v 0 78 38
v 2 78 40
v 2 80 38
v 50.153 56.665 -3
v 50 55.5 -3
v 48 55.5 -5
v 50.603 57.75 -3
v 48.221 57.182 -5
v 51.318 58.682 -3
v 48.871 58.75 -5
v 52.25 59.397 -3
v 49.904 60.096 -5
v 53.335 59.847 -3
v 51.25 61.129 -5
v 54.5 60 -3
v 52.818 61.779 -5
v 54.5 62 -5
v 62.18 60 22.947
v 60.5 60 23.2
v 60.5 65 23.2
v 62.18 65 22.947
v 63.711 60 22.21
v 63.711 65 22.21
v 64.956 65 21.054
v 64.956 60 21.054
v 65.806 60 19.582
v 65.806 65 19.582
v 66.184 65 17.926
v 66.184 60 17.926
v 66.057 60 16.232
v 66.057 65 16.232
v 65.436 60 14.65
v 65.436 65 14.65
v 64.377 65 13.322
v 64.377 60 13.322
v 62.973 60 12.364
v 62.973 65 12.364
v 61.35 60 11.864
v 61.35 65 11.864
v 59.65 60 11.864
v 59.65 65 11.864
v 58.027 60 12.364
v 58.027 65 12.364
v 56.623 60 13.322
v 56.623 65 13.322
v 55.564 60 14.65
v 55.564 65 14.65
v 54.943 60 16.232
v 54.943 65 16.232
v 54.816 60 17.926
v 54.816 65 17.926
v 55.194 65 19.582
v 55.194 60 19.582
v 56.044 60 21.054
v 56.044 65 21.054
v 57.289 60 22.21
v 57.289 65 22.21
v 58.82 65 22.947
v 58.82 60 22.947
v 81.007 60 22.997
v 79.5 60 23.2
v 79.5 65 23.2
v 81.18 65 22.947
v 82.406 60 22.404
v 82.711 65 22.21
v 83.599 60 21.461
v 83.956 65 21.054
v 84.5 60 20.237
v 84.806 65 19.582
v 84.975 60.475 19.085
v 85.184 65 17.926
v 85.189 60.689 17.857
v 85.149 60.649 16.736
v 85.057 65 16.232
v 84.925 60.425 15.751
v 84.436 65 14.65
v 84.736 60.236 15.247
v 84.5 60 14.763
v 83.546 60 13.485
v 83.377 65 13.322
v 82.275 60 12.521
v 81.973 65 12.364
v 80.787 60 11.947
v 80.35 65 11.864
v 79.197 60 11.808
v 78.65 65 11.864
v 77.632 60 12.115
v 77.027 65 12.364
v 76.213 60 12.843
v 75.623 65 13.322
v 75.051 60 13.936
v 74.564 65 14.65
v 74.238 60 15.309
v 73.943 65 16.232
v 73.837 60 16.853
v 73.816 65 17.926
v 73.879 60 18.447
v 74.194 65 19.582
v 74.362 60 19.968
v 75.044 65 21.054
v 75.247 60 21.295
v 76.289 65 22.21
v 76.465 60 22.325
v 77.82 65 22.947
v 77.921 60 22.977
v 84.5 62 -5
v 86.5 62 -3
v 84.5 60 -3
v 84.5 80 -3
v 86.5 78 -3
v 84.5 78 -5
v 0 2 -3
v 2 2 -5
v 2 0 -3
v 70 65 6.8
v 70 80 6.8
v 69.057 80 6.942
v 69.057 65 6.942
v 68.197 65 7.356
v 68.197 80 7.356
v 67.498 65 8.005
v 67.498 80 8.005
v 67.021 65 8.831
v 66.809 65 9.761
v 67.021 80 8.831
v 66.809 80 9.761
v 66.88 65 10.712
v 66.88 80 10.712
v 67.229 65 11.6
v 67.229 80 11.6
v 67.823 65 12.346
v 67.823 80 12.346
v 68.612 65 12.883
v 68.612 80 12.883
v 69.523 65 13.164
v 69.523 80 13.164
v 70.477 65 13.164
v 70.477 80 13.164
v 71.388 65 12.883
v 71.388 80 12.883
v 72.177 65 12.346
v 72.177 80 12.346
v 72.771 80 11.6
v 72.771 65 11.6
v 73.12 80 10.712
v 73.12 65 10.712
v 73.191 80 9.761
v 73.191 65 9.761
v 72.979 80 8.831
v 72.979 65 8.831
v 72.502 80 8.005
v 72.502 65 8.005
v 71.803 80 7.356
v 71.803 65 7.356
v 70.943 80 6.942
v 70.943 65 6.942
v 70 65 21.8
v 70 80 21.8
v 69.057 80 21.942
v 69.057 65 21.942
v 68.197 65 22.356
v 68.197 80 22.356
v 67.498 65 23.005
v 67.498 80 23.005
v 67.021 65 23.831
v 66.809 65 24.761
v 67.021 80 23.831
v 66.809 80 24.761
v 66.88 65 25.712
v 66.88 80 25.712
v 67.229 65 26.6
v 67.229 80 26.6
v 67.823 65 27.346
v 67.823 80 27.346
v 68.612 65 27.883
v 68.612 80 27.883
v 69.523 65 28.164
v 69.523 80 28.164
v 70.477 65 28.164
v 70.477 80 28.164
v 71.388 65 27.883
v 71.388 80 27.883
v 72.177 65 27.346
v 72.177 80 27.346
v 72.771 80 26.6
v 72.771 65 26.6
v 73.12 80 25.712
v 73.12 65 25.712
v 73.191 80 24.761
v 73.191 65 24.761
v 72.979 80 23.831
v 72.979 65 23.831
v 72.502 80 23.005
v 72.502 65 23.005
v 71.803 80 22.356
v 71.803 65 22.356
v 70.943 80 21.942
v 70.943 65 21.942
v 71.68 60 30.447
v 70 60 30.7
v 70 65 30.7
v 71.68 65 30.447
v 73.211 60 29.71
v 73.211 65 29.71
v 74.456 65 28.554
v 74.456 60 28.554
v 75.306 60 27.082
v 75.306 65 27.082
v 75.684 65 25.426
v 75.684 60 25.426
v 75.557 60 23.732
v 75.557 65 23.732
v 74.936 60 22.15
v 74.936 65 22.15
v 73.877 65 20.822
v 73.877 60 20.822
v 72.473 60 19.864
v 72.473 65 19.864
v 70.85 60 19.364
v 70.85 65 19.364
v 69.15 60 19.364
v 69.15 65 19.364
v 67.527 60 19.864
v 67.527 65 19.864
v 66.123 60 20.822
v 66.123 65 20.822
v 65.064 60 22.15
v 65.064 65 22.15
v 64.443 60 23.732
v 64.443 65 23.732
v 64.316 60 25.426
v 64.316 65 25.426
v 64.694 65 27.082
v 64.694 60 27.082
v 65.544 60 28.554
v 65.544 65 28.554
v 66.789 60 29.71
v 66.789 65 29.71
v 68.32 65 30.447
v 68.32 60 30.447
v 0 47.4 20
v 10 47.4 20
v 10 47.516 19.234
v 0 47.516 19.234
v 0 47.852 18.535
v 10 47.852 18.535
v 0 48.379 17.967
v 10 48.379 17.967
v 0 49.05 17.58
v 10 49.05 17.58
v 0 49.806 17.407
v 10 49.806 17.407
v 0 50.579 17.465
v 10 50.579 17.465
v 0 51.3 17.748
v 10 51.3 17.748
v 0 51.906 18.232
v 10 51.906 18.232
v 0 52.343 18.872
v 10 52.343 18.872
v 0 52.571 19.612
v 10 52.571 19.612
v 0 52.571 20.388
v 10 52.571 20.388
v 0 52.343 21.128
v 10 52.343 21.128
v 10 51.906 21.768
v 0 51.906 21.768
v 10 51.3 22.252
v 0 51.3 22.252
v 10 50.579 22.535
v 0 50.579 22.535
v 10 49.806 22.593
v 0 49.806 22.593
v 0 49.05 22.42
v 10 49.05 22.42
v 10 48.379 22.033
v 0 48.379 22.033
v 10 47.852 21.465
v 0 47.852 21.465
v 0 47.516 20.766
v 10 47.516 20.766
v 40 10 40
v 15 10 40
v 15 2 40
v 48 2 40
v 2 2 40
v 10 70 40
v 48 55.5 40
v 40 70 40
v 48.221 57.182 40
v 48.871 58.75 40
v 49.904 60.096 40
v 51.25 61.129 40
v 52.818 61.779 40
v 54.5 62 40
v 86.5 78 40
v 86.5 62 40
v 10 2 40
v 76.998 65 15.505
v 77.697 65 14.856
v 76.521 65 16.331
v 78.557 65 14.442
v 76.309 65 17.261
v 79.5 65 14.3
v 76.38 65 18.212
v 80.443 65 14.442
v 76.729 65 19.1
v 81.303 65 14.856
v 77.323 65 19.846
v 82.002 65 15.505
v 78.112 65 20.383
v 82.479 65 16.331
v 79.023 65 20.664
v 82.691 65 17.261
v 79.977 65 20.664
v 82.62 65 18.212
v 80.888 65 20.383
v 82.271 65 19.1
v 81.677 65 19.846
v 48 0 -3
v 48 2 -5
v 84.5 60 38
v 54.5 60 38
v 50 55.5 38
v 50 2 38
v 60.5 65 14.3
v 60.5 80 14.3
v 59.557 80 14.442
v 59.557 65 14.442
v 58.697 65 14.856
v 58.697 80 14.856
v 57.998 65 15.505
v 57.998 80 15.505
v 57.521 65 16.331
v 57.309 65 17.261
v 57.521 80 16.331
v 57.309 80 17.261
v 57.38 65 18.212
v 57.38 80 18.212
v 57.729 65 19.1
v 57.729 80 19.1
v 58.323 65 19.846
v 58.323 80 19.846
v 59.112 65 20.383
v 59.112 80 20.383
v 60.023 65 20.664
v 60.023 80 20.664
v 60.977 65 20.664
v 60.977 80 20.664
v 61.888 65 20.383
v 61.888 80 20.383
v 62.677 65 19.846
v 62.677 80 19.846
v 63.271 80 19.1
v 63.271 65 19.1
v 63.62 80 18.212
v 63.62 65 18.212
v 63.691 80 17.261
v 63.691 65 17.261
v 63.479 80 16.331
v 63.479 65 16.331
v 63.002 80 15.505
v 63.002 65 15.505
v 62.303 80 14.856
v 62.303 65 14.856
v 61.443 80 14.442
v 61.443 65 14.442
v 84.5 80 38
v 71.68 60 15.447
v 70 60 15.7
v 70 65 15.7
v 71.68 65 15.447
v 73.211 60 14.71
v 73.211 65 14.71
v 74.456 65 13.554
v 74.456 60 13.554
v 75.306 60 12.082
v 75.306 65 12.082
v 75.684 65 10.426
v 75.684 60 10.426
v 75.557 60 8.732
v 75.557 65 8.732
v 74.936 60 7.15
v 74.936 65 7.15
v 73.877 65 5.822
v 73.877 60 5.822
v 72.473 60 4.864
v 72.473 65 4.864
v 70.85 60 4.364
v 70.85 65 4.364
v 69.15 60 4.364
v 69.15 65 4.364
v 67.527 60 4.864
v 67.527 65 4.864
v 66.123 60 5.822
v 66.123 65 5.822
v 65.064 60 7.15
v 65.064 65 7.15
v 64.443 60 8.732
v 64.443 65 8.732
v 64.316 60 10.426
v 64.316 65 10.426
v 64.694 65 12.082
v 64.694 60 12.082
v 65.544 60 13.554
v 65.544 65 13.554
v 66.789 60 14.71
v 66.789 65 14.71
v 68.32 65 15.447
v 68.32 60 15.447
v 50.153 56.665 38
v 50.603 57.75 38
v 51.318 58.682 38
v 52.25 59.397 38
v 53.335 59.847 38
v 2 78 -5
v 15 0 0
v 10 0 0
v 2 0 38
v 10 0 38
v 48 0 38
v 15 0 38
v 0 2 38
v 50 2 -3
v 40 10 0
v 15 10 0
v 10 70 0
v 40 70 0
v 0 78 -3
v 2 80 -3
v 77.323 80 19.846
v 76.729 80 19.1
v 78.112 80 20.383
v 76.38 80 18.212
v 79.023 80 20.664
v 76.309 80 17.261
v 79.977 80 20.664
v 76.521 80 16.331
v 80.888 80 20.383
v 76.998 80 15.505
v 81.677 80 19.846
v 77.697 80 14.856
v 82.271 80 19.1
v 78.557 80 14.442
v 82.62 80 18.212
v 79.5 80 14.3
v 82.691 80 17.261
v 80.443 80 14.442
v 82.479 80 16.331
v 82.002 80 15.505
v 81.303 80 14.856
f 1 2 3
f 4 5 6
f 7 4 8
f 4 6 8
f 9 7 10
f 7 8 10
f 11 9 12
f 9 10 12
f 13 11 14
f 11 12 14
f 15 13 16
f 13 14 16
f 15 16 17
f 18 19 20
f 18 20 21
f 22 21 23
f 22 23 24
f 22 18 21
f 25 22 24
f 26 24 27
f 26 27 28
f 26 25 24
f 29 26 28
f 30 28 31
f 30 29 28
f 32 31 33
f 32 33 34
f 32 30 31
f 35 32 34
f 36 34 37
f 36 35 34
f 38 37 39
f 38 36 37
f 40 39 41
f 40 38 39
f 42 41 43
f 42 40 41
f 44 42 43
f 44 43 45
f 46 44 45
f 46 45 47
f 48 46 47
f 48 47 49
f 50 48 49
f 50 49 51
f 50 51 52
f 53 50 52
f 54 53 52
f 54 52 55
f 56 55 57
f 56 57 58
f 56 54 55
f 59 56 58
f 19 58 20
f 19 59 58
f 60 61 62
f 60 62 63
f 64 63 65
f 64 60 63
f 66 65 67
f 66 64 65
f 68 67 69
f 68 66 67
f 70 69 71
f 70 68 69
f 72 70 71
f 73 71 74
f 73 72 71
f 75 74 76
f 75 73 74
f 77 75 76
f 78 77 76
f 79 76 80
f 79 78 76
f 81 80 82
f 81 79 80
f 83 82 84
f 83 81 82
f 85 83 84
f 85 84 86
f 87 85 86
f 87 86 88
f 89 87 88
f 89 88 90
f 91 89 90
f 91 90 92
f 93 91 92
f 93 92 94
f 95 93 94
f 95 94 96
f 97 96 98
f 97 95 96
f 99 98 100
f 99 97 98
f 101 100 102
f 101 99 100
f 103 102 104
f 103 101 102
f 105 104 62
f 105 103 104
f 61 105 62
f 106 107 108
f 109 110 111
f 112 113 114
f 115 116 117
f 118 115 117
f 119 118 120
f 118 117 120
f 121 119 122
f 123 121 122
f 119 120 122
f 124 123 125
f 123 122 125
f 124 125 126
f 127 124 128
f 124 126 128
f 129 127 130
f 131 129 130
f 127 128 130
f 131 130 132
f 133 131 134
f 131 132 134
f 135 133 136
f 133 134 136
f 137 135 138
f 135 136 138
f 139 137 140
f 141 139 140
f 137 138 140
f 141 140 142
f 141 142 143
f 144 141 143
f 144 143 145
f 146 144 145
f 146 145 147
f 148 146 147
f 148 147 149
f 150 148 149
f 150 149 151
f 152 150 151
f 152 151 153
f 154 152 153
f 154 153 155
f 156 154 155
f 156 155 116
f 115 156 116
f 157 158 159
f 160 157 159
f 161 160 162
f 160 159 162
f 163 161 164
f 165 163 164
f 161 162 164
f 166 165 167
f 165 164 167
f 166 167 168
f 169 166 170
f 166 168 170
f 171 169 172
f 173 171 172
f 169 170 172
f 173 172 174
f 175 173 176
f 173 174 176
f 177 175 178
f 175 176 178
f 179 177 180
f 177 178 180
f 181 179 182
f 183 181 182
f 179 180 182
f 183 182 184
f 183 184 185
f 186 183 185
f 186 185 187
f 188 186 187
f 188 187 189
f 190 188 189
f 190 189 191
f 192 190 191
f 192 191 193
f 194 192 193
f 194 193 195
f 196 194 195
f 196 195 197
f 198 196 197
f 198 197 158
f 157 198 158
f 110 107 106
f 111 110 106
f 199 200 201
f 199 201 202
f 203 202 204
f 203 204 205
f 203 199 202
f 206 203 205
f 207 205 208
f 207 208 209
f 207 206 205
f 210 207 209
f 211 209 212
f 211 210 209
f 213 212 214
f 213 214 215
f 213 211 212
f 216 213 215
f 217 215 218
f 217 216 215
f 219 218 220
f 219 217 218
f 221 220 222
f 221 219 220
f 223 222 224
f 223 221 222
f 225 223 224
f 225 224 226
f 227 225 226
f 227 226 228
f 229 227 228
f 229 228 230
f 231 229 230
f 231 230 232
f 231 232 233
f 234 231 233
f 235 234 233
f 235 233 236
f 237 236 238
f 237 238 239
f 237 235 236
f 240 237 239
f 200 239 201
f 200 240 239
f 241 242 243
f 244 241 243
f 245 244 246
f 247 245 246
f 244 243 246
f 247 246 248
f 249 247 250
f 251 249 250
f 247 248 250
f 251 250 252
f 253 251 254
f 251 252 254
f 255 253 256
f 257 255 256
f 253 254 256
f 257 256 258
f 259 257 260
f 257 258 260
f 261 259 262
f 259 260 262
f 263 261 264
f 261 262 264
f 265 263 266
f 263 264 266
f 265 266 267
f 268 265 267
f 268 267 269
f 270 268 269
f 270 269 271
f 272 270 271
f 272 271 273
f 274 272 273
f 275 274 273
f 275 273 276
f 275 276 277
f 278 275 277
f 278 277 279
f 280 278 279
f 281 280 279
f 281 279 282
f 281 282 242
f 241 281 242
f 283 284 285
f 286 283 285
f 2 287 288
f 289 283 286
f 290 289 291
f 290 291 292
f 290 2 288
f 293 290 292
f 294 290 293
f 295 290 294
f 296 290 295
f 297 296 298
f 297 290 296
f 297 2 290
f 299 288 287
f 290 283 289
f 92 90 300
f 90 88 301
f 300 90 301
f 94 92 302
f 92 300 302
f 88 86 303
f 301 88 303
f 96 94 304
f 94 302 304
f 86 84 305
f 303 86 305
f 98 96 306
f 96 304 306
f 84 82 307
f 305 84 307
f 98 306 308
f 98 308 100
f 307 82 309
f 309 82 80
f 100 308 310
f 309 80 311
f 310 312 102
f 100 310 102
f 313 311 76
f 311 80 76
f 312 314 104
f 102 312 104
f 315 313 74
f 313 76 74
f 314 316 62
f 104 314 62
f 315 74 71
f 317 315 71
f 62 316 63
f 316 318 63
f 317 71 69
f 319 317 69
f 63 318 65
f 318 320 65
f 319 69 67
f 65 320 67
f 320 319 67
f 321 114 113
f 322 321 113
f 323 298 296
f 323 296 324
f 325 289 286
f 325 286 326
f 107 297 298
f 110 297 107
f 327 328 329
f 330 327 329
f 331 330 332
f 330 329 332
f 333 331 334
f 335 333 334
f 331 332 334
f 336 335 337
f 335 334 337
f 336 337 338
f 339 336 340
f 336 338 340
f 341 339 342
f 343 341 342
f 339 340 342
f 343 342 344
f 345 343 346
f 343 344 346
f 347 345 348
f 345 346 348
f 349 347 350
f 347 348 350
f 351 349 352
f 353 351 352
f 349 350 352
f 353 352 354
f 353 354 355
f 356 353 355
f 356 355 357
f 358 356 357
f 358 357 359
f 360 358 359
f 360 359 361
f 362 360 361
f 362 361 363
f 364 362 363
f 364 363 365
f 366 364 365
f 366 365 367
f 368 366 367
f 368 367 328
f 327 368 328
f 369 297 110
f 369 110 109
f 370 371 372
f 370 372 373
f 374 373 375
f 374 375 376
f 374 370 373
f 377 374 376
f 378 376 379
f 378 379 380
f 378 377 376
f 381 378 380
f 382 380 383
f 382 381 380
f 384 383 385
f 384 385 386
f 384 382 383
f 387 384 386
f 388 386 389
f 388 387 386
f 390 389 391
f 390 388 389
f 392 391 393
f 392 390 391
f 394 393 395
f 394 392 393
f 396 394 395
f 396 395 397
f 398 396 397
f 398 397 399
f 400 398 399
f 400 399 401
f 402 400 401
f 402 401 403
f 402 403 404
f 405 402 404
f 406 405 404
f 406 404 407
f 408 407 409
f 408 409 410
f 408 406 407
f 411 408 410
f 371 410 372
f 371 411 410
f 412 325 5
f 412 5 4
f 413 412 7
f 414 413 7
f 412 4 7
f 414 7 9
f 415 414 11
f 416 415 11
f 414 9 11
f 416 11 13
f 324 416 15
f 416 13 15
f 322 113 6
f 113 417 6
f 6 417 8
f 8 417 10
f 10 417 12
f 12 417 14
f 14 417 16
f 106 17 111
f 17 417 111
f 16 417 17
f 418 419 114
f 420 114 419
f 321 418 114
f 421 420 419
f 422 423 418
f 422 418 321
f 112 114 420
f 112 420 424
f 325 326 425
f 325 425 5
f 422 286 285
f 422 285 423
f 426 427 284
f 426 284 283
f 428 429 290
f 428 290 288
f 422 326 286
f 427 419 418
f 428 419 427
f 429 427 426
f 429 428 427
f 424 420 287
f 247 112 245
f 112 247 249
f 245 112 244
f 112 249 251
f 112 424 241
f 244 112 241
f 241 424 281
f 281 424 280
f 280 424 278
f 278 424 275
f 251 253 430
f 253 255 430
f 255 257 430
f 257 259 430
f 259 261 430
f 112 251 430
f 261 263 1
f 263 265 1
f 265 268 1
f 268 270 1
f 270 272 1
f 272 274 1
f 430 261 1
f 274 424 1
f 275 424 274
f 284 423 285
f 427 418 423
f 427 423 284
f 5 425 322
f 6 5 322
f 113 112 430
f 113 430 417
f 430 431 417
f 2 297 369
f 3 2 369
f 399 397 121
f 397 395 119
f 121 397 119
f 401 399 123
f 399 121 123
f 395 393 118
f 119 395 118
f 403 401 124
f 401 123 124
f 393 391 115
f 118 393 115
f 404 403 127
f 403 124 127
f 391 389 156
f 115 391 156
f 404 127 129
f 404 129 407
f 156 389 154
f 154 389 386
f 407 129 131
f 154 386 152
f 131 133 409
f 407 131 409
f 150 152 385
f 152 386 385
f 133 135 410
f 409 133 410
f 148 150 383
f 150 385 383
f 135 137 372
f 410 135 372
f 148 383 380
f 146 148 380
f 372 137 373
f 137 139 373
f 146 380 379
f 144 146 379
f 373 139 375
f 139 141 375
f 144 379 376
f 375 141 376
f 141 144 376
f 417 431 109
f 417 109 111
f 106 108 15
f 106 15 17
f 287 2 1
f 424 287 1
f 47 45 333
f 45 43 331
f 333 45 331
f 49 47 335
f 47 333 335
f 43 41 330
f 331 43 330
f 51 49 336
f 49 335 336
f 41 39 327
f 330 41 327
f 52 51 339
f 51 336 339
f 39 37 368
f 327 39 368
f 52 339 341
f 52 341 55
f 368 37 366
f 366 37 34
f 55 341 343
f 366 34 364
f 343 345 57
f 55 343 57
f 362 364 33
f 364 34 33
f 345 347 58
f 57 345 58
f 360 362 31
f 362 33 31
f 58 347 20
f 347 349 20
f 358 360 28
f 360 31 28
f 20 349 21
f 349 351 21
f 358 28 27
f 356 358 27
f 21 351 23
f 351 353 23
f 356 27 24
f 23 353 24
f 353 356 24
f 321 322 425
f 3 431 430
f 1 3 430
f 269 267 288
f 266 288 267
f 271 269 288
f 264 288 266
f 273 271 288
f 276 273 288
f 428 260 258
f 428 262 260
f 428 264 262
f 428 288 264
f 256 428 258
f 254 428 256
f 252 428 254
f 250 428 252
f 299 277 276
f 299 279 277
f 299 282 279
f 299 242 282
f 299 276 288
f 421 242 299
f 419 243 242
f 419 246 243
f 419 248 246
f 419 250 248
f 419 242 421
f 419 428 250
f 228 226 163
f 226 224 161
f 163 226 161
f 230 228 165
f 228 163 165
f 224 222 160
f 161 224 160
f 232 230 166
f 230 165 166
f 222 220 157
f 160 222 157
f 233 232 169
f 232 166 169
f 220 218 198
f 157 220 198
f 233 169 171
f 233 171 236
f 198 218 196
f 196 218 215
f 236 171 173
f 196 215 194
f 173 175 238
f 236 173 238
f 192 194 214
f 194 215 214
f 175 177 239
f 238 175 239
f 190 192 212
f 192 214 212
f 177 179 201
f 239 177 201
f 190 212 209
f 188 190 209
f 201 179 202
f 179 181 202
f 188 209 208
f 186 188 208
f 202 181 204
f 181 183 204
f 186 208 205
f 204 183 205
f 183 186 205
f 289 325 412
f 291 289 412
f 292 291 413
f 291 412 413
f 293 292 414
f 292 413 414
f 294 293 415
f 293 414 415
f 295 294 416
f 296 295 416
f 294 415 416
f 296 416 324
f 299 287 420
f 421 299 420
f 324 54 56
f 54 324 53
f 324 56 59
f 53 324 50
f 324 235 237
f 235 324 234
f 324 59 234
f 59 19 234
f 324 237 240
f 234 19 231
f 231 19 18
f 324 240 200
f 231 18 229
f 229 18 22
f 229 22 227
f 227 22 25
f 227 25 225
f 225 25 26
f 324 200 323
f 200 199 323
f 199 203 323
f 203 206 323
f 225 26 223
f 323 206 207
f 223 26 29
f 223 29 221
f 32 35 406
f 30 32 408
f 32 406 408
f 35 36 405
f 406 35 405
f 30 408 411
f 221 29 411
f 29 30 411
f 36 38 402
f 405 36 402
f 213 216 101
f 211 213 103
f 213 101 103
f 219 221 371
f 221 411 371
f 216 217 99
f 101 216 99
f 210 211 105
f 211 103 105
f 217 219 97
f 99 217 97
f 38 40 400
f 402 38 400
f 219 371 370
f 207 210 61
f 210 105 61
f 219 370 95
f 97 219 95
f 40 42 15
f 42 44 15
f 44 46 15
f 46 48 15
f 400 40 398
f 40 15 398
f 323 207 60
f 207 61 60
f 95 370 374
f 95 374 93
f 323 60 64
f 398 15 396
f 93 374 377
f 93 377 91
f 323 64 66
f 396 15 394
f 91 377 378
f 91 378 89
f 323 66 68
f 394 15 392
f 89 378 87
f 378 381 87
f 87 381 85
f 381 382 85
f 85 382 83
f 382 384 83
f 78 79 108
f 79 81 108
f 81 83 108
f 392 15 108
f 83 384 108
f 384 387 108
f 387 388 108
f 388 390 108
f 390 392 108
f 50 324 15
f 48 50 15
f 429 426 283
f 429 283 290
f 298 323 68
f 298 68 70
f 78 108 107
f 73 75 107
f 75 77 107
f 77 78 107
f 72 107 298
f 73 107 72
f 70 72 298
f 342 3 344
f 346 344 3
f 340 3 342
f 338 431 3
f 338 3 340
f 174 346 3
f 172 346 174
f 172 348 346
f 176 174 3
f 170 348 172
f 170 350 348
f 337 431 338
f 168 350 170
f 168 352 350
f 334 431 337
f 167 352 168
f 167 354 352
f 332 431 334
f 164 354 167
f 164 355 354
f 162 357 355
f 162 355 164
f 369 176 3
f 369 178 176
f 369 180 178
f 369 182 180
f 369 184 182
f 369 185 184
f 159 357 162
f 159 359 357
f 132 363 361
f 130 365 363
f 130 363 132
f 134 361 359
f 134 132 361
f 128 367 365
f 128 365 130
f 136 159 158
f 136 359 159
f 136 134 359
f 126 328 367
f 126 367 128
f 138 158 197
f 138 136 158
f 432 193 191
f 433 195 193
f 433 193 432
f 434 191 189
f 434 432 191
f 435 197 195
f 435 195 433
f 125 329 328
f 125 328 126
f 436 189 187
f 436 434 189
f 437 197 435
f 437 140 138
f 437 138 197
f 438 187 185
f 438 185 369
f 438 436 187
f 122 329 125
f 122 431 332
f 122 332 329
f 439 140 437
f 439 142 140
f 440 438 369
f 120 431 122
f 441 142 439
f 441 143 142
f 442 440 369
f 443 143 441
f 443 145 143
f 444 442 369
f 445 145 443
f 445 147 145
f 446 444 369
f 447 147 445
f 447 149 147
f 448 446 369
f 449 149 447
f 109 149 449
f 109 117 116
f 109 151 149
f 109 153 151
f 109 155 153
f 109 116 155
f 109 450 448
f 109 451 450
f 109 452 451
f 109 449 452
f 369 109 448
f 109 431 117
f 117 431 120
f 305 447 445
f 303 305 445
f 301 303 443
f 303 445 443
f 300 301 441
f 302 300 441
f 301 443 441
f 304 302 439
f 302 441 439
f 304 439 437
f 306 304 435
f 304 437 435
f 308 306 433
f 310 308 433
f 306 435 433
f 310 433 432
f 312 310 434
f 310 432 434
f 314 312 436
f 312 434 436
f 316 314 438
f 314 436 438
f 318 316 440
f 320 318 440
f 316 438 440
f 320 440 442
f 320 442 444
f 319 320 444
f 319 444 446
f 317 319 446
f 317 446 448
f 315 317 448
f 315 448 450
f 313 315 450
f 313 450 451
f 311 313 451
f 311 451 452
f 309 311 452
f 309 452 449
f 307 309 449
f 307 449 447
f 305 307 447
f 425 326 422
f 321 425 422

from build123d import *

# Parameters (mm, degrees)
BOSS_EXTRUDE1_DEPTH = 40
CUT_EXTRUDE1_START  = 10
SKETCH2_R           = 2.6
CUT_EXTRUDE1_DEPTH  = 113.46950766
SKETCH9_W           = 50
SKETCH9_H           = 80
BOSS_EXTRUDE2_DEPTH = 5
BOSS_EXTRUDE4_START = 80
SKETCH11_W          = 36.5
SKETCH11_H          = 45
SKETCH11_R          = 3.2
BOSS_EXTRUDE4_DEPTH = 20
CUT_EXTRUDE11_START = 60
SKETCH12_R          = 5.7
CUT_EXTRUDE11_DEPTH = 5
FILLET1_R           = 4.5


with BuildPart() as part:
    # Sketch1 → Boss-Extrude1 (new body)
    with BuildSketch(Plane.XY):
        Polygon((10, 0), (0, 0), (0, 80), (50, 80), (50, 0), (15, 0), (15, 10), (40, 10), (40, 70), (10, 70), align=None)
    extrude(amount=BOSS_EXTRUDE1_DEPTH)

    # Sketch2 → Cut-Extrude1 (cut, through all)
    with BuildSketch(Plane(origin=(0, 0, 0), x_dir=(0, 0, -1), z_dir=(1, 0, 0)).offset(CUT_EXTRUDE1_START)):
        with Locations(Location((-20, 50, 0), (0, 0, 270))):
            Circle(SKETCH2_R)
    extrude(amount=-CUT_EXTRUDE1_DEPTH, mode=Mode.SUBTRACT)

    # Sketch9 → Boss-Extrude2 (add)
    with BuildSketch(Plane.XY):
        with Locations((25, 40)):
            Rectangle(SKETCH9_W, SKETCH9_H)
    extrude(amount=-BOSS_EXTRUDE2_DEPTH)

    # Sketch11 → Boss-Extrude4 (add)
    with BuildSketch(Plane(origin=(0, 0, 0), x_dir=(1, 0, 0), z_dir=(0, 1, 0)).offset(BOSS_EXTRUDE4_START)):
        with Locations((68.25, -17.5)):
            Rectangle(SKETCH11_W, SKETCH11_H)
        with Locations(Location((60.5, -17.5, 0), (0, 0, 90))):
            Circle(SKETCH11_R, mode=Mode.SUBTRACT)
        with Locations(Location((70, -10, 0), (0, 0, 90))):
            Circle(SKETCH11_R, mode=Mode.SUBTRACT)
        with Locations(Location((79.5, -17.5, 0), (0, 0, 90))):
            Circle(SKETCH11_R, mode=Mode.SUBTRACT)
        with Locations(Location((70, -25, 0), (0, 0, 90))):
            Circle(SKETCH11_R, mode=Mode.SUBTRACT)
    extrude(amount=-BOSS_EXTRUDE4_DEPTH)

    # Sketch12 → Cut-Extrude11 (cut)
    with BuildSketch(Plane(origin=(0, 0, 0), x_dir=(1, 0, 0), z_dir=(0, 1, 0)).offset(CUT_EXTRUDE11_START)):
        with Locations(Location((70, -10, 0), (0, 0, 270))):
            Circle(SKETCH12_R)
        with Locations(Location((79.5, -17.5, 0), (0, 0, 270))):
            Circle(SKETCH12_R)
        with Locations(Location((70, -25, 0), (0, 0, 270))):
            Circle(SKETCH12_R)
        with Locations(Location((60.5, -17.5, 0), (0, 0, 270))):
            Circle(SKETCH12_R)
    extrude(amount=CUT_EXTRUDE11_DEPTH, mode=Mode.SUBTRACT)

    # Fillet1
    fillet1_edges = [part.edges().sort_by_distance(p)[0] for p in [
        (50, 60, 17.5),
    ]]
    fillet(fillet1_edges, radius=FILLET1_R)

    # Chamfer1
    # the kernel refuses this chamfer: 2 mm, written as the material it takes off along each edge
    with BuildSketch(Plane(origin=(1.333333333, 1.333333333, 38.666666667), x_dir=(0, -0.7071067811865475, -0.7071067811865475), z_dir=(-0.5773502691896347, -0.5773502691896213, 0.5773502691896212)), Plane(origin=(1.333333333, 78.666666667, -3.666666667), x_dir=(0, 0.7071067811865475, 0.7071067811865475), z_dir=(-0.5773502691896258, 0.5773502691896258, -0.5773502691896258)), Plane(origin=(48.666666667, 1.333333333, -3.666666667), x_dir=(-0.7071067811865475, 0, -0.7071067811865475), z_dir=(0.5773502691897349, -0.5773502691894069, -0.5773502691897356)), Plane(origin=(48.666666667, 1.333333333, 38.666666667), x_dir=(0.7071067811865464, 0, -0.7071067811865488), z_dir=(0.5773502691897359, -0.5773502691894074, 0.577350269189734)), Plane(origin=(85.166666667, 78.666666667, -3.666666667), x_dir=(0.7071067811865477, 0, 0.7071067811865474), z_dir=(0.5773502691896257, 0.5773502691896257, -0.577350269189626)), Plane(origin=(85.166666667, 61.333333333, -3.666666667), x_dir=(0.7071067811865475, 0.7071067811865475, 0), z_dir=(0.5773502691896256, -0.5773502691896257, -0.5773502691896258))) as chamfer1_piece_1:
        Polygon((-1.414213562, 0.816496581), (1.414213562, 0.816496581), (0, -1.632993162), align=None)
    extrude(amount=2.540341184, mode=Mode.SUBTRACT)
    with BuildSketch(Plane(origin=(1.333333333, 1.333333333, -3.666666667), x_dir=(0, -0.7071067811865558, 0.7071067811865391), z_dir=(-0.5773502691896303, -0.5773502691896167, -0.5773502691896303)), Plane(origin=(1.333333333, 78.666666667, 38.666666667), x_dir=(0, 0.7071067811865475, -0.7071067811865475), z_dir=(-0.5773502691896258, 0.5773502691896258, 0.5773502691896258))) as chamfer1_piece_2:
        Polygon((-1.414213562, -0.816496581), (1.414213562, -0.816496581), (0, 1.632993162), align=None)
    extrude(amount=2.540341184, mode=Mode.SUBTRACT)
    with BuildSketch(Plane(origin=(0, 0, 45.143365976), x_dir=(0.9996219169112961, -0.027495876610609604, 0), z_dir=(0, 0, -1)), Plane(origin=(86.5, 80, -10.143365976), x_dir=(0.027495876610589005, -0.9996219169112968, 0), z_dir=(0, 0, 1)), Plane(origin=(86.5, 60, -10.143365976), x_dir=(-0.9996219169112968, -0.02749587661058555, 0), z_dir=(0, 0, 1))) as chamfer1_piece_3:
        with BuildLine():
            Line((2.05734639, 0), (-0.11309431, -2.054235587))
            Line((-0.11309431, -2.054235587), (-0.153079186, -2.053135752))
            ThreePointArc((-0.153079186, -2.053135752), (-0.068258454, -1.026795659), (-0.039984877, 0.001099835))
            Line((-0.039984877, 0.001099835), (0.001099835, 0.039984877))
            ThreePointArc((0.001099835, 0.039984877), (1.028995329, 0.011711299), (2.058446225, 0.039984877))
            Line((2.058446225, 0.039984877), (2.05734639, 0))
        make_face()
    extrude(amount=55.286731952, mode=Mode.SUBTRACT)
    with BuildSketch(Plane(origin=(0, 80, 45.143365976), x_dir=(0.9996219169112968, 0.02749587661058908, 0), z_dir=(0, 0, -1)), Plane(origin=(50, 0, -10.143365976), x_dir=(0.027495876610585633, 0.9996219169112968, 0), z_dir=(0, 0, 1))) as chamfer1_piece_4:
        with BuildLine():
            Line((2.05734639, 0), (-0.11309431, 2.054235587))
            Line((-0.11309431, 2.054235587), (-0.153079186, 2.053135752))
            ThreePointArc((-0.153079186, 2.053135752), (-0.068258454, 1.026795659), (-0.039984877, -0.001099835))
            Line((-0.039984877, -0.001099835), (0.001099835, -0.039984877))
            ThreePointArc((0.001099835, -0.039984877), (1.028995329, -0.011711299), (2.058446225, -0.039984877))
            Line((2.058446225, -0.039984877), (2.05734639, 0))
        make_face()
    extrude(amount=55.286731952, mode=Mode.SUBTRACT)
    with BuildSketch(Plane(origin=(55.143365976, 0, 40), x_dir=(0, 0.9996219169112968, 0.02749587661058563), z_dir=(-1, 0, 0))) as chamfer1_piece_5:
        with BuildLine():
            Line((2.05734639, 0), (-0.11309431, 2.054235587))
            Line((-0.11309431, 2.054235587), (-0.153079186, 2.053135752))
            ThreePointArc((-0.153079186, 2.053135752), (-0.068258454, 1.026795659), (-0.039984877, -0.001099835))
            Line((-0.039984877, -0.001099835), (0.001099835, -0.039984877))
            ThreePointArc((0.001099835, -0.039984877), (1.028995329, -0.011711299), (2.058446225, -0.039984877))
            Line((2.058446225, -0.039984877), (2.05734639, 0))
        make_face()
    extrude(amount=45.286731952, mode=Mode.SUBTRACT)
    with BuildSketch(Plane(origin=(50, 55.5, 40), x_dir=(-0.9996219169112968, 0, 0.027495876610585647), z_dir=(0, -1, 0))) as chamfer1_piece_6:
        with BuildLine():
            Line((2.05734639, 0), (-0.11309431, 2.054235587))
            Line((-0.11309431, 2.054235587), (-0.153079186, 2.053135752))
            ThreePointArc((-0.153079186, 2.053135752), (-0.068258454, 1.026795659), (-0.039984877, -0.001099835))
            Line((-0.039984877, -0.001099835), (0.001099835, -0.039984877))
            ThreePointArc((0.001099835, -0.039984877), (1.028995329, -0.011711299), (2.058446225, -0.039984877))
            Line((2.058446225, -0.039984877), (2.05734639, 0))
        make_face()
    extrude(amount=60.643365976, mode=Mode.SUBTRACT)
    with BuildSketch(Plane(origin=(91.643365976, 80, 40), x_dir=(0, -0.9996219169112968, 0.02749587661058555), z_dir=(-1, 0, 0))) as chamfer1_piece_7:
        with BuildLine():
            Line((2.05734639, 0), (-0.11309431, -2.054235587))
            Line((-0.11309431, -2.054235587), (-0.153079186, -2.053135752))
            ThreePointArc((-0.153079186, -2.053135752), (-0.068258454, -1.026795659), (-0.039984877, 0.001099835))
            Line((-0.039984877, 0.001099835), (0.001099835, 0.039984877))
            ThreePointArc((0.001099835, 0.039984877), (1.028995329, 0.011711299), (2.058446225, 0.039984877))
            Line((2.058446225, 0.039984877), (2.05734639, 0))
        make_face()
    extrude(amount=96.786731952, mode=Mode.SUBTRACT)
    with BuildSketch(Plane(origin=(50, -5.143365976, -5), x_dir=(0.02749587661058563, 0, 0.9996219169112968), z_dir=(0, 1, 0))) as chamfer1_piece_8:
        with BuildLine():
            Line((2.05734639, 0), (-0.11309431, -2.054235587))
            Line((-0.11309431, -2.054235587), (-0.153079186, -2.053135752))
            ThreePointArc((-0.153079186, -2.053135752), (-0.068258454, -1.026795659), (-0.039984877, 0.001099835))
            Line((-0.039984877, 0.001099835), (0.001099835, 0.039984877))
            ThreePointArc((0.001099835, 0.039984877), (1.028995329, 0.011711299), (2.058446225, 0.039984877))
            Line((2.058446225, 0.039984877), (2.05734639, 0))
        make_face()
    extrude(amount=60.643365976, mode=Mode.SUBTRACT)
    with BuildSketch(Plane(origin=(-5.143365976, 0, -5), x_dir=(0, -0.027495876610586372, 0.9996219169112968), z_dir=(1, 0, 0))) as chamfer1_piece_9:
        with BuildLine():
            Line((2.05734639, 0), (-0.11309431, -2.054235587))
            Line((-0.11309431, -2.054235587), (-0.153079186, -2.053135752))
            ThreePointArc((-0.153079186, -2.053135752), (-0.068258454, -1.026795659), (-0.039984877, 0.001099835))
            Line((-0.039984877, 0.001099835), (0.001099835, 0.039984877))
            ThreePointArc((0.001099835, 0.039984877), (1.028995329, 0.011711299), (2.058446225, 0.039984877))
            Line((2.058446225, 0.039984877), (2.05734639, 0))
        make_face()
    extrude(amount=60.286731952, mode=Mode.SUBTRACT)
    with BuildSketch(Plane(origin=(0, 85.143365976, -5), x_dir=(-0.027495876610586372, 0, 0.9996219169112968), z_dir=(0, -1, 0))) as chamfer1_piece_10:
        with BuildLine():
            Line((2.05734639, 0), (-0.11309431, -2.054235587))
            Line((-0.11309431, -2.054235587), (-0.153079186, -2.053135752))
            ThreePointArc((-0.153079186, -2.053135752), (-0.068258454, -1.026795659), (-0.039984877, 0.001099835))
            Line((-0.039984877, 0.001099835), (0.001099835, 0.039984877))
            ThreePointArc((0.001099835, 0.039984877), (1.028995329, 0.011711299), (2.058446225, 0.039984877))
            Line((2.058446225, 0.039984877), (2.05734639, 0))
        make_face()
    extrude(amount=90.286731952, mode=Mode.SUBTRACT)
    with BuildSketch(Plane(origin=(0, -5.143365976, 40), x_dir=(0.9996219169112968, 0, 0.02749587661058563), z_dir=(0, 1, 0))) as chamfer1_piece_11:
        with BuildLine():
            Line((2.05734639, 0), (-0.11309431, 2.054235587))
            Line((-0.11309431, 2.054235587), (-0.153079186, 2.053135752))
            ThreePointArc((-0.153079186, 2.053135752), (-0.068258454, 1.026795659), (-0.039984877, -0.001099835))
            Line((-0.039984877, -0.001099835), (0.001099835, -0.039984877))
            ThreePointArc((0.001099835, -0.039984877), (1.028995329, -0.011711299), (2.058446225, -0.039984877))
            Line((2.058446225, -0.039984877), (2.05734639, 0))
        make_face()
    extrude(amount=90.286731952, mode=Mode.SUBTRACT)
    with BuildSketch(Plane(origin=(-5.143365976, 80, -5), x_dir=(0, 0.02749587661058908, 0.9996219169112968), z_dir=(1, 0, 0))) as chamfer1_piece_12:
        with BuildLine():
            Line((2.05734639, 0), (-0.11309431, 2.054235587))
            Line((-0.11309431, 2.054235587), (-0.153079186, 2.053135752))
            ThreePointArc((-0.153079186, 2.053135752), (-0.068258454, 1.026795659), (-0.039984877, -0.001099835))
            Line((-0.039984877, -0.001099835), (0.001099835, -0.039984877))
            ThreePointArc((0.001099835, -0.039984877), (1.028995329, -0.011711299), (2.058446225, -0.039984877))
            Line((2.058446225, -0.039984877), (2.05734639, 0))
        make_face()
    extrude(amount=96.786731952, mode=Mode.SUBTRACT)
    with BuildSketch(Plane(origin=(15.143365976, 0, 40), x_dir=(2.3568108242796768e-14, 0.9996219169112968, 0.027495876610585623), z_dir=(-1, 0, 0))) as chamfer1_piece_13:
        with BuildLine():
            Line((2.05734639, 0), (-0.11309431, 2.054235587))
            Line((-0.11309431, 2.054235587), (-0.153079186, 2.053135752))
            ThreePointArc((-0.153079186, 2.053135752), (-0.068258454, 1.026795659), (-0.039984877, -0.001099835))
            Line((-0.039984877, -0.001099835), (0.001099835, -0.039984877))
            ThreePointArc((0.001099835, -0.039984877), (1.028995329, -0.011711299), (2.058446225, -0.039984877))
            Line((2.058446225, -0.039984877), (2.05734639, 0))
        make_face()
    extrude(amount=20.286731952, mode=Mode.SUBTRACT)
    with BuildSketch(Plane(origin=(54.5, 60, -5), x_dir=(0, -0.027495876610585616, 0.9996219169112968), z_dir=(1, 0, 0))) as chamfer1_piece_14:
        with BuildLine():
            Line((2.05734639, 0), (-0.11309431, -2.054235587))
            Line((-0.11309431, -2.054235587), (-0.153079186, -2.053135752))
            ThreePointArc((-0.153079186, -2.053135752), (-0.068258454, -1.026795659), (-0.039984877, 0.001099835))
            Line((-0.039984877, 0.001099835), (0.001099835, 0.039984877))
            ThreePointArc((0.001099835, 0.039984877), (1.028995329, 0.011711299), (2.058446225, 0.039984877))
            Line((2.058446225, 0.039984877), (2.05734639, 0))
        make_face()
    extrude(amount=37.143365976, mode=Mode.SUBTRACT)
    with BuildSketch(Plane(origin=(86.5, 85.143365976, -5), x_dir=(0.02749587661058908, 0, 0.9996219169112968), z_dir=(0, -1, 0))) as chamfer1_piece_15:
        with BuildLine():
            Line((2.05734639, 0), (-0.11309431, 2.054235587))
            Line((-0.11309431, 2.054235587), (-0.153079186, 2.053135752))
            ThreePointArc((-0.153079186, 2.053135752), (-0.068258454, 1.026795659), (-0.039984877, -0.001099835))
            Line((-0.039984877, -0.001099835), (0.001099835, -0.039984877))
            ThreePointArc((0.001099835, -0.039984877), (1.028995329, -0.011711299), (2.058446225, -0.039984877))
            Line((2.058446225, -0.039984877), (2.05734639, 0))
        make_face()
    extrude(amount=30.286731952, mode=Mode.SUBTRACT)
    with BuildSketch(Plane(origin=(91.643365976, 60, 40), x_dir=(0, 0.9996219169112968, 0.027495876610585647), z_dir=(-1, 0, 0))) as chamfer1_piece_16:
        with BuildLine():
            Line((2.05734639, 0), (-0.11309431, 2.054235587))
            Line((-0.11309431, 2.054235587), (-0.153079186, 2.053135752))
            ThreePointArc((-0.153079186, 2.053135752), (-0.068258454, 1.026795659), (-0.039984877, -0.001099835))
            Line((-0.039984877, -0.001099835), (0.001099835, -0.039984877))
            ThreePointArc((0.001099835, -0.039984877), (1.028995329, -0.011711299), (2.058446225, -0.039984877))
            Line((2.058446225, -0.039984877), (2.05734639, 0))
        make_face()
    extrude(amount=37.143365976, mode=Mode.SUBTRACT)
    with BuildSketch(Plane(origin=(54.5, 55.5, 40), x_dir=(-1, 0, 0), z_dir=(0, -1, 0))) as chamfer1_piece_17:
        with BuildLine():
            Line((6.556568542, -0.056568542), (4.443431458, 2.056568542))
            Line((4.443431458, 2.056568542), (4.403431458, 2.056568542))
            ThreePointArc((4.403431458, 2.056568542), (4.46, 1.028284271), (4.46, 0))
            Line((4.46, 0), (4.5, -0.04))
            ThreePointArc((4.5, -0.04), (5.528284271, -0.04), (6.556568542, -0.096568542))
            Line((6.556568542, -0.096568542), (6.556568542, -0.056568542))
        make_face()
    revolve(axis=Axis((54.5, 55.5, 40), (0, 0, -1)), revolution_arc=90, mode=Mode.SUBTRACT)
    with BuildSketch(Plane(origin=(54.5, 55.5, -5), x_dir=(-1, 0, 0), z_dir=(0, -1, 0))) as chamfer1_piece_18:
        with BuildLine():
            Line((4.443431458, -2.056568542), (6.556568542, 0.056568542))
            Line((6.556568542, 0.056568542), (6.556568542, 0.096568542))
            ThreePointArc((6.556568542, 0.096568542), (5.528284271, 0.04), (4.5, 0.04))
            Line((4.5, 0.04), (4.46, 0))
            ThreePointArc((4.46, 0), (4.46, -1.028284271), (4.403431458, -2.056568542))
            Line((4.403431458, -2.056568542), (4.443431458, -2.056568542))
        make_face()
    revolve(axis=Axis((54.5, 55.5, -5), (0, 0, -1)), revolution_arc=90, mode=Mode.SUBTRACT)


solid = part.part
